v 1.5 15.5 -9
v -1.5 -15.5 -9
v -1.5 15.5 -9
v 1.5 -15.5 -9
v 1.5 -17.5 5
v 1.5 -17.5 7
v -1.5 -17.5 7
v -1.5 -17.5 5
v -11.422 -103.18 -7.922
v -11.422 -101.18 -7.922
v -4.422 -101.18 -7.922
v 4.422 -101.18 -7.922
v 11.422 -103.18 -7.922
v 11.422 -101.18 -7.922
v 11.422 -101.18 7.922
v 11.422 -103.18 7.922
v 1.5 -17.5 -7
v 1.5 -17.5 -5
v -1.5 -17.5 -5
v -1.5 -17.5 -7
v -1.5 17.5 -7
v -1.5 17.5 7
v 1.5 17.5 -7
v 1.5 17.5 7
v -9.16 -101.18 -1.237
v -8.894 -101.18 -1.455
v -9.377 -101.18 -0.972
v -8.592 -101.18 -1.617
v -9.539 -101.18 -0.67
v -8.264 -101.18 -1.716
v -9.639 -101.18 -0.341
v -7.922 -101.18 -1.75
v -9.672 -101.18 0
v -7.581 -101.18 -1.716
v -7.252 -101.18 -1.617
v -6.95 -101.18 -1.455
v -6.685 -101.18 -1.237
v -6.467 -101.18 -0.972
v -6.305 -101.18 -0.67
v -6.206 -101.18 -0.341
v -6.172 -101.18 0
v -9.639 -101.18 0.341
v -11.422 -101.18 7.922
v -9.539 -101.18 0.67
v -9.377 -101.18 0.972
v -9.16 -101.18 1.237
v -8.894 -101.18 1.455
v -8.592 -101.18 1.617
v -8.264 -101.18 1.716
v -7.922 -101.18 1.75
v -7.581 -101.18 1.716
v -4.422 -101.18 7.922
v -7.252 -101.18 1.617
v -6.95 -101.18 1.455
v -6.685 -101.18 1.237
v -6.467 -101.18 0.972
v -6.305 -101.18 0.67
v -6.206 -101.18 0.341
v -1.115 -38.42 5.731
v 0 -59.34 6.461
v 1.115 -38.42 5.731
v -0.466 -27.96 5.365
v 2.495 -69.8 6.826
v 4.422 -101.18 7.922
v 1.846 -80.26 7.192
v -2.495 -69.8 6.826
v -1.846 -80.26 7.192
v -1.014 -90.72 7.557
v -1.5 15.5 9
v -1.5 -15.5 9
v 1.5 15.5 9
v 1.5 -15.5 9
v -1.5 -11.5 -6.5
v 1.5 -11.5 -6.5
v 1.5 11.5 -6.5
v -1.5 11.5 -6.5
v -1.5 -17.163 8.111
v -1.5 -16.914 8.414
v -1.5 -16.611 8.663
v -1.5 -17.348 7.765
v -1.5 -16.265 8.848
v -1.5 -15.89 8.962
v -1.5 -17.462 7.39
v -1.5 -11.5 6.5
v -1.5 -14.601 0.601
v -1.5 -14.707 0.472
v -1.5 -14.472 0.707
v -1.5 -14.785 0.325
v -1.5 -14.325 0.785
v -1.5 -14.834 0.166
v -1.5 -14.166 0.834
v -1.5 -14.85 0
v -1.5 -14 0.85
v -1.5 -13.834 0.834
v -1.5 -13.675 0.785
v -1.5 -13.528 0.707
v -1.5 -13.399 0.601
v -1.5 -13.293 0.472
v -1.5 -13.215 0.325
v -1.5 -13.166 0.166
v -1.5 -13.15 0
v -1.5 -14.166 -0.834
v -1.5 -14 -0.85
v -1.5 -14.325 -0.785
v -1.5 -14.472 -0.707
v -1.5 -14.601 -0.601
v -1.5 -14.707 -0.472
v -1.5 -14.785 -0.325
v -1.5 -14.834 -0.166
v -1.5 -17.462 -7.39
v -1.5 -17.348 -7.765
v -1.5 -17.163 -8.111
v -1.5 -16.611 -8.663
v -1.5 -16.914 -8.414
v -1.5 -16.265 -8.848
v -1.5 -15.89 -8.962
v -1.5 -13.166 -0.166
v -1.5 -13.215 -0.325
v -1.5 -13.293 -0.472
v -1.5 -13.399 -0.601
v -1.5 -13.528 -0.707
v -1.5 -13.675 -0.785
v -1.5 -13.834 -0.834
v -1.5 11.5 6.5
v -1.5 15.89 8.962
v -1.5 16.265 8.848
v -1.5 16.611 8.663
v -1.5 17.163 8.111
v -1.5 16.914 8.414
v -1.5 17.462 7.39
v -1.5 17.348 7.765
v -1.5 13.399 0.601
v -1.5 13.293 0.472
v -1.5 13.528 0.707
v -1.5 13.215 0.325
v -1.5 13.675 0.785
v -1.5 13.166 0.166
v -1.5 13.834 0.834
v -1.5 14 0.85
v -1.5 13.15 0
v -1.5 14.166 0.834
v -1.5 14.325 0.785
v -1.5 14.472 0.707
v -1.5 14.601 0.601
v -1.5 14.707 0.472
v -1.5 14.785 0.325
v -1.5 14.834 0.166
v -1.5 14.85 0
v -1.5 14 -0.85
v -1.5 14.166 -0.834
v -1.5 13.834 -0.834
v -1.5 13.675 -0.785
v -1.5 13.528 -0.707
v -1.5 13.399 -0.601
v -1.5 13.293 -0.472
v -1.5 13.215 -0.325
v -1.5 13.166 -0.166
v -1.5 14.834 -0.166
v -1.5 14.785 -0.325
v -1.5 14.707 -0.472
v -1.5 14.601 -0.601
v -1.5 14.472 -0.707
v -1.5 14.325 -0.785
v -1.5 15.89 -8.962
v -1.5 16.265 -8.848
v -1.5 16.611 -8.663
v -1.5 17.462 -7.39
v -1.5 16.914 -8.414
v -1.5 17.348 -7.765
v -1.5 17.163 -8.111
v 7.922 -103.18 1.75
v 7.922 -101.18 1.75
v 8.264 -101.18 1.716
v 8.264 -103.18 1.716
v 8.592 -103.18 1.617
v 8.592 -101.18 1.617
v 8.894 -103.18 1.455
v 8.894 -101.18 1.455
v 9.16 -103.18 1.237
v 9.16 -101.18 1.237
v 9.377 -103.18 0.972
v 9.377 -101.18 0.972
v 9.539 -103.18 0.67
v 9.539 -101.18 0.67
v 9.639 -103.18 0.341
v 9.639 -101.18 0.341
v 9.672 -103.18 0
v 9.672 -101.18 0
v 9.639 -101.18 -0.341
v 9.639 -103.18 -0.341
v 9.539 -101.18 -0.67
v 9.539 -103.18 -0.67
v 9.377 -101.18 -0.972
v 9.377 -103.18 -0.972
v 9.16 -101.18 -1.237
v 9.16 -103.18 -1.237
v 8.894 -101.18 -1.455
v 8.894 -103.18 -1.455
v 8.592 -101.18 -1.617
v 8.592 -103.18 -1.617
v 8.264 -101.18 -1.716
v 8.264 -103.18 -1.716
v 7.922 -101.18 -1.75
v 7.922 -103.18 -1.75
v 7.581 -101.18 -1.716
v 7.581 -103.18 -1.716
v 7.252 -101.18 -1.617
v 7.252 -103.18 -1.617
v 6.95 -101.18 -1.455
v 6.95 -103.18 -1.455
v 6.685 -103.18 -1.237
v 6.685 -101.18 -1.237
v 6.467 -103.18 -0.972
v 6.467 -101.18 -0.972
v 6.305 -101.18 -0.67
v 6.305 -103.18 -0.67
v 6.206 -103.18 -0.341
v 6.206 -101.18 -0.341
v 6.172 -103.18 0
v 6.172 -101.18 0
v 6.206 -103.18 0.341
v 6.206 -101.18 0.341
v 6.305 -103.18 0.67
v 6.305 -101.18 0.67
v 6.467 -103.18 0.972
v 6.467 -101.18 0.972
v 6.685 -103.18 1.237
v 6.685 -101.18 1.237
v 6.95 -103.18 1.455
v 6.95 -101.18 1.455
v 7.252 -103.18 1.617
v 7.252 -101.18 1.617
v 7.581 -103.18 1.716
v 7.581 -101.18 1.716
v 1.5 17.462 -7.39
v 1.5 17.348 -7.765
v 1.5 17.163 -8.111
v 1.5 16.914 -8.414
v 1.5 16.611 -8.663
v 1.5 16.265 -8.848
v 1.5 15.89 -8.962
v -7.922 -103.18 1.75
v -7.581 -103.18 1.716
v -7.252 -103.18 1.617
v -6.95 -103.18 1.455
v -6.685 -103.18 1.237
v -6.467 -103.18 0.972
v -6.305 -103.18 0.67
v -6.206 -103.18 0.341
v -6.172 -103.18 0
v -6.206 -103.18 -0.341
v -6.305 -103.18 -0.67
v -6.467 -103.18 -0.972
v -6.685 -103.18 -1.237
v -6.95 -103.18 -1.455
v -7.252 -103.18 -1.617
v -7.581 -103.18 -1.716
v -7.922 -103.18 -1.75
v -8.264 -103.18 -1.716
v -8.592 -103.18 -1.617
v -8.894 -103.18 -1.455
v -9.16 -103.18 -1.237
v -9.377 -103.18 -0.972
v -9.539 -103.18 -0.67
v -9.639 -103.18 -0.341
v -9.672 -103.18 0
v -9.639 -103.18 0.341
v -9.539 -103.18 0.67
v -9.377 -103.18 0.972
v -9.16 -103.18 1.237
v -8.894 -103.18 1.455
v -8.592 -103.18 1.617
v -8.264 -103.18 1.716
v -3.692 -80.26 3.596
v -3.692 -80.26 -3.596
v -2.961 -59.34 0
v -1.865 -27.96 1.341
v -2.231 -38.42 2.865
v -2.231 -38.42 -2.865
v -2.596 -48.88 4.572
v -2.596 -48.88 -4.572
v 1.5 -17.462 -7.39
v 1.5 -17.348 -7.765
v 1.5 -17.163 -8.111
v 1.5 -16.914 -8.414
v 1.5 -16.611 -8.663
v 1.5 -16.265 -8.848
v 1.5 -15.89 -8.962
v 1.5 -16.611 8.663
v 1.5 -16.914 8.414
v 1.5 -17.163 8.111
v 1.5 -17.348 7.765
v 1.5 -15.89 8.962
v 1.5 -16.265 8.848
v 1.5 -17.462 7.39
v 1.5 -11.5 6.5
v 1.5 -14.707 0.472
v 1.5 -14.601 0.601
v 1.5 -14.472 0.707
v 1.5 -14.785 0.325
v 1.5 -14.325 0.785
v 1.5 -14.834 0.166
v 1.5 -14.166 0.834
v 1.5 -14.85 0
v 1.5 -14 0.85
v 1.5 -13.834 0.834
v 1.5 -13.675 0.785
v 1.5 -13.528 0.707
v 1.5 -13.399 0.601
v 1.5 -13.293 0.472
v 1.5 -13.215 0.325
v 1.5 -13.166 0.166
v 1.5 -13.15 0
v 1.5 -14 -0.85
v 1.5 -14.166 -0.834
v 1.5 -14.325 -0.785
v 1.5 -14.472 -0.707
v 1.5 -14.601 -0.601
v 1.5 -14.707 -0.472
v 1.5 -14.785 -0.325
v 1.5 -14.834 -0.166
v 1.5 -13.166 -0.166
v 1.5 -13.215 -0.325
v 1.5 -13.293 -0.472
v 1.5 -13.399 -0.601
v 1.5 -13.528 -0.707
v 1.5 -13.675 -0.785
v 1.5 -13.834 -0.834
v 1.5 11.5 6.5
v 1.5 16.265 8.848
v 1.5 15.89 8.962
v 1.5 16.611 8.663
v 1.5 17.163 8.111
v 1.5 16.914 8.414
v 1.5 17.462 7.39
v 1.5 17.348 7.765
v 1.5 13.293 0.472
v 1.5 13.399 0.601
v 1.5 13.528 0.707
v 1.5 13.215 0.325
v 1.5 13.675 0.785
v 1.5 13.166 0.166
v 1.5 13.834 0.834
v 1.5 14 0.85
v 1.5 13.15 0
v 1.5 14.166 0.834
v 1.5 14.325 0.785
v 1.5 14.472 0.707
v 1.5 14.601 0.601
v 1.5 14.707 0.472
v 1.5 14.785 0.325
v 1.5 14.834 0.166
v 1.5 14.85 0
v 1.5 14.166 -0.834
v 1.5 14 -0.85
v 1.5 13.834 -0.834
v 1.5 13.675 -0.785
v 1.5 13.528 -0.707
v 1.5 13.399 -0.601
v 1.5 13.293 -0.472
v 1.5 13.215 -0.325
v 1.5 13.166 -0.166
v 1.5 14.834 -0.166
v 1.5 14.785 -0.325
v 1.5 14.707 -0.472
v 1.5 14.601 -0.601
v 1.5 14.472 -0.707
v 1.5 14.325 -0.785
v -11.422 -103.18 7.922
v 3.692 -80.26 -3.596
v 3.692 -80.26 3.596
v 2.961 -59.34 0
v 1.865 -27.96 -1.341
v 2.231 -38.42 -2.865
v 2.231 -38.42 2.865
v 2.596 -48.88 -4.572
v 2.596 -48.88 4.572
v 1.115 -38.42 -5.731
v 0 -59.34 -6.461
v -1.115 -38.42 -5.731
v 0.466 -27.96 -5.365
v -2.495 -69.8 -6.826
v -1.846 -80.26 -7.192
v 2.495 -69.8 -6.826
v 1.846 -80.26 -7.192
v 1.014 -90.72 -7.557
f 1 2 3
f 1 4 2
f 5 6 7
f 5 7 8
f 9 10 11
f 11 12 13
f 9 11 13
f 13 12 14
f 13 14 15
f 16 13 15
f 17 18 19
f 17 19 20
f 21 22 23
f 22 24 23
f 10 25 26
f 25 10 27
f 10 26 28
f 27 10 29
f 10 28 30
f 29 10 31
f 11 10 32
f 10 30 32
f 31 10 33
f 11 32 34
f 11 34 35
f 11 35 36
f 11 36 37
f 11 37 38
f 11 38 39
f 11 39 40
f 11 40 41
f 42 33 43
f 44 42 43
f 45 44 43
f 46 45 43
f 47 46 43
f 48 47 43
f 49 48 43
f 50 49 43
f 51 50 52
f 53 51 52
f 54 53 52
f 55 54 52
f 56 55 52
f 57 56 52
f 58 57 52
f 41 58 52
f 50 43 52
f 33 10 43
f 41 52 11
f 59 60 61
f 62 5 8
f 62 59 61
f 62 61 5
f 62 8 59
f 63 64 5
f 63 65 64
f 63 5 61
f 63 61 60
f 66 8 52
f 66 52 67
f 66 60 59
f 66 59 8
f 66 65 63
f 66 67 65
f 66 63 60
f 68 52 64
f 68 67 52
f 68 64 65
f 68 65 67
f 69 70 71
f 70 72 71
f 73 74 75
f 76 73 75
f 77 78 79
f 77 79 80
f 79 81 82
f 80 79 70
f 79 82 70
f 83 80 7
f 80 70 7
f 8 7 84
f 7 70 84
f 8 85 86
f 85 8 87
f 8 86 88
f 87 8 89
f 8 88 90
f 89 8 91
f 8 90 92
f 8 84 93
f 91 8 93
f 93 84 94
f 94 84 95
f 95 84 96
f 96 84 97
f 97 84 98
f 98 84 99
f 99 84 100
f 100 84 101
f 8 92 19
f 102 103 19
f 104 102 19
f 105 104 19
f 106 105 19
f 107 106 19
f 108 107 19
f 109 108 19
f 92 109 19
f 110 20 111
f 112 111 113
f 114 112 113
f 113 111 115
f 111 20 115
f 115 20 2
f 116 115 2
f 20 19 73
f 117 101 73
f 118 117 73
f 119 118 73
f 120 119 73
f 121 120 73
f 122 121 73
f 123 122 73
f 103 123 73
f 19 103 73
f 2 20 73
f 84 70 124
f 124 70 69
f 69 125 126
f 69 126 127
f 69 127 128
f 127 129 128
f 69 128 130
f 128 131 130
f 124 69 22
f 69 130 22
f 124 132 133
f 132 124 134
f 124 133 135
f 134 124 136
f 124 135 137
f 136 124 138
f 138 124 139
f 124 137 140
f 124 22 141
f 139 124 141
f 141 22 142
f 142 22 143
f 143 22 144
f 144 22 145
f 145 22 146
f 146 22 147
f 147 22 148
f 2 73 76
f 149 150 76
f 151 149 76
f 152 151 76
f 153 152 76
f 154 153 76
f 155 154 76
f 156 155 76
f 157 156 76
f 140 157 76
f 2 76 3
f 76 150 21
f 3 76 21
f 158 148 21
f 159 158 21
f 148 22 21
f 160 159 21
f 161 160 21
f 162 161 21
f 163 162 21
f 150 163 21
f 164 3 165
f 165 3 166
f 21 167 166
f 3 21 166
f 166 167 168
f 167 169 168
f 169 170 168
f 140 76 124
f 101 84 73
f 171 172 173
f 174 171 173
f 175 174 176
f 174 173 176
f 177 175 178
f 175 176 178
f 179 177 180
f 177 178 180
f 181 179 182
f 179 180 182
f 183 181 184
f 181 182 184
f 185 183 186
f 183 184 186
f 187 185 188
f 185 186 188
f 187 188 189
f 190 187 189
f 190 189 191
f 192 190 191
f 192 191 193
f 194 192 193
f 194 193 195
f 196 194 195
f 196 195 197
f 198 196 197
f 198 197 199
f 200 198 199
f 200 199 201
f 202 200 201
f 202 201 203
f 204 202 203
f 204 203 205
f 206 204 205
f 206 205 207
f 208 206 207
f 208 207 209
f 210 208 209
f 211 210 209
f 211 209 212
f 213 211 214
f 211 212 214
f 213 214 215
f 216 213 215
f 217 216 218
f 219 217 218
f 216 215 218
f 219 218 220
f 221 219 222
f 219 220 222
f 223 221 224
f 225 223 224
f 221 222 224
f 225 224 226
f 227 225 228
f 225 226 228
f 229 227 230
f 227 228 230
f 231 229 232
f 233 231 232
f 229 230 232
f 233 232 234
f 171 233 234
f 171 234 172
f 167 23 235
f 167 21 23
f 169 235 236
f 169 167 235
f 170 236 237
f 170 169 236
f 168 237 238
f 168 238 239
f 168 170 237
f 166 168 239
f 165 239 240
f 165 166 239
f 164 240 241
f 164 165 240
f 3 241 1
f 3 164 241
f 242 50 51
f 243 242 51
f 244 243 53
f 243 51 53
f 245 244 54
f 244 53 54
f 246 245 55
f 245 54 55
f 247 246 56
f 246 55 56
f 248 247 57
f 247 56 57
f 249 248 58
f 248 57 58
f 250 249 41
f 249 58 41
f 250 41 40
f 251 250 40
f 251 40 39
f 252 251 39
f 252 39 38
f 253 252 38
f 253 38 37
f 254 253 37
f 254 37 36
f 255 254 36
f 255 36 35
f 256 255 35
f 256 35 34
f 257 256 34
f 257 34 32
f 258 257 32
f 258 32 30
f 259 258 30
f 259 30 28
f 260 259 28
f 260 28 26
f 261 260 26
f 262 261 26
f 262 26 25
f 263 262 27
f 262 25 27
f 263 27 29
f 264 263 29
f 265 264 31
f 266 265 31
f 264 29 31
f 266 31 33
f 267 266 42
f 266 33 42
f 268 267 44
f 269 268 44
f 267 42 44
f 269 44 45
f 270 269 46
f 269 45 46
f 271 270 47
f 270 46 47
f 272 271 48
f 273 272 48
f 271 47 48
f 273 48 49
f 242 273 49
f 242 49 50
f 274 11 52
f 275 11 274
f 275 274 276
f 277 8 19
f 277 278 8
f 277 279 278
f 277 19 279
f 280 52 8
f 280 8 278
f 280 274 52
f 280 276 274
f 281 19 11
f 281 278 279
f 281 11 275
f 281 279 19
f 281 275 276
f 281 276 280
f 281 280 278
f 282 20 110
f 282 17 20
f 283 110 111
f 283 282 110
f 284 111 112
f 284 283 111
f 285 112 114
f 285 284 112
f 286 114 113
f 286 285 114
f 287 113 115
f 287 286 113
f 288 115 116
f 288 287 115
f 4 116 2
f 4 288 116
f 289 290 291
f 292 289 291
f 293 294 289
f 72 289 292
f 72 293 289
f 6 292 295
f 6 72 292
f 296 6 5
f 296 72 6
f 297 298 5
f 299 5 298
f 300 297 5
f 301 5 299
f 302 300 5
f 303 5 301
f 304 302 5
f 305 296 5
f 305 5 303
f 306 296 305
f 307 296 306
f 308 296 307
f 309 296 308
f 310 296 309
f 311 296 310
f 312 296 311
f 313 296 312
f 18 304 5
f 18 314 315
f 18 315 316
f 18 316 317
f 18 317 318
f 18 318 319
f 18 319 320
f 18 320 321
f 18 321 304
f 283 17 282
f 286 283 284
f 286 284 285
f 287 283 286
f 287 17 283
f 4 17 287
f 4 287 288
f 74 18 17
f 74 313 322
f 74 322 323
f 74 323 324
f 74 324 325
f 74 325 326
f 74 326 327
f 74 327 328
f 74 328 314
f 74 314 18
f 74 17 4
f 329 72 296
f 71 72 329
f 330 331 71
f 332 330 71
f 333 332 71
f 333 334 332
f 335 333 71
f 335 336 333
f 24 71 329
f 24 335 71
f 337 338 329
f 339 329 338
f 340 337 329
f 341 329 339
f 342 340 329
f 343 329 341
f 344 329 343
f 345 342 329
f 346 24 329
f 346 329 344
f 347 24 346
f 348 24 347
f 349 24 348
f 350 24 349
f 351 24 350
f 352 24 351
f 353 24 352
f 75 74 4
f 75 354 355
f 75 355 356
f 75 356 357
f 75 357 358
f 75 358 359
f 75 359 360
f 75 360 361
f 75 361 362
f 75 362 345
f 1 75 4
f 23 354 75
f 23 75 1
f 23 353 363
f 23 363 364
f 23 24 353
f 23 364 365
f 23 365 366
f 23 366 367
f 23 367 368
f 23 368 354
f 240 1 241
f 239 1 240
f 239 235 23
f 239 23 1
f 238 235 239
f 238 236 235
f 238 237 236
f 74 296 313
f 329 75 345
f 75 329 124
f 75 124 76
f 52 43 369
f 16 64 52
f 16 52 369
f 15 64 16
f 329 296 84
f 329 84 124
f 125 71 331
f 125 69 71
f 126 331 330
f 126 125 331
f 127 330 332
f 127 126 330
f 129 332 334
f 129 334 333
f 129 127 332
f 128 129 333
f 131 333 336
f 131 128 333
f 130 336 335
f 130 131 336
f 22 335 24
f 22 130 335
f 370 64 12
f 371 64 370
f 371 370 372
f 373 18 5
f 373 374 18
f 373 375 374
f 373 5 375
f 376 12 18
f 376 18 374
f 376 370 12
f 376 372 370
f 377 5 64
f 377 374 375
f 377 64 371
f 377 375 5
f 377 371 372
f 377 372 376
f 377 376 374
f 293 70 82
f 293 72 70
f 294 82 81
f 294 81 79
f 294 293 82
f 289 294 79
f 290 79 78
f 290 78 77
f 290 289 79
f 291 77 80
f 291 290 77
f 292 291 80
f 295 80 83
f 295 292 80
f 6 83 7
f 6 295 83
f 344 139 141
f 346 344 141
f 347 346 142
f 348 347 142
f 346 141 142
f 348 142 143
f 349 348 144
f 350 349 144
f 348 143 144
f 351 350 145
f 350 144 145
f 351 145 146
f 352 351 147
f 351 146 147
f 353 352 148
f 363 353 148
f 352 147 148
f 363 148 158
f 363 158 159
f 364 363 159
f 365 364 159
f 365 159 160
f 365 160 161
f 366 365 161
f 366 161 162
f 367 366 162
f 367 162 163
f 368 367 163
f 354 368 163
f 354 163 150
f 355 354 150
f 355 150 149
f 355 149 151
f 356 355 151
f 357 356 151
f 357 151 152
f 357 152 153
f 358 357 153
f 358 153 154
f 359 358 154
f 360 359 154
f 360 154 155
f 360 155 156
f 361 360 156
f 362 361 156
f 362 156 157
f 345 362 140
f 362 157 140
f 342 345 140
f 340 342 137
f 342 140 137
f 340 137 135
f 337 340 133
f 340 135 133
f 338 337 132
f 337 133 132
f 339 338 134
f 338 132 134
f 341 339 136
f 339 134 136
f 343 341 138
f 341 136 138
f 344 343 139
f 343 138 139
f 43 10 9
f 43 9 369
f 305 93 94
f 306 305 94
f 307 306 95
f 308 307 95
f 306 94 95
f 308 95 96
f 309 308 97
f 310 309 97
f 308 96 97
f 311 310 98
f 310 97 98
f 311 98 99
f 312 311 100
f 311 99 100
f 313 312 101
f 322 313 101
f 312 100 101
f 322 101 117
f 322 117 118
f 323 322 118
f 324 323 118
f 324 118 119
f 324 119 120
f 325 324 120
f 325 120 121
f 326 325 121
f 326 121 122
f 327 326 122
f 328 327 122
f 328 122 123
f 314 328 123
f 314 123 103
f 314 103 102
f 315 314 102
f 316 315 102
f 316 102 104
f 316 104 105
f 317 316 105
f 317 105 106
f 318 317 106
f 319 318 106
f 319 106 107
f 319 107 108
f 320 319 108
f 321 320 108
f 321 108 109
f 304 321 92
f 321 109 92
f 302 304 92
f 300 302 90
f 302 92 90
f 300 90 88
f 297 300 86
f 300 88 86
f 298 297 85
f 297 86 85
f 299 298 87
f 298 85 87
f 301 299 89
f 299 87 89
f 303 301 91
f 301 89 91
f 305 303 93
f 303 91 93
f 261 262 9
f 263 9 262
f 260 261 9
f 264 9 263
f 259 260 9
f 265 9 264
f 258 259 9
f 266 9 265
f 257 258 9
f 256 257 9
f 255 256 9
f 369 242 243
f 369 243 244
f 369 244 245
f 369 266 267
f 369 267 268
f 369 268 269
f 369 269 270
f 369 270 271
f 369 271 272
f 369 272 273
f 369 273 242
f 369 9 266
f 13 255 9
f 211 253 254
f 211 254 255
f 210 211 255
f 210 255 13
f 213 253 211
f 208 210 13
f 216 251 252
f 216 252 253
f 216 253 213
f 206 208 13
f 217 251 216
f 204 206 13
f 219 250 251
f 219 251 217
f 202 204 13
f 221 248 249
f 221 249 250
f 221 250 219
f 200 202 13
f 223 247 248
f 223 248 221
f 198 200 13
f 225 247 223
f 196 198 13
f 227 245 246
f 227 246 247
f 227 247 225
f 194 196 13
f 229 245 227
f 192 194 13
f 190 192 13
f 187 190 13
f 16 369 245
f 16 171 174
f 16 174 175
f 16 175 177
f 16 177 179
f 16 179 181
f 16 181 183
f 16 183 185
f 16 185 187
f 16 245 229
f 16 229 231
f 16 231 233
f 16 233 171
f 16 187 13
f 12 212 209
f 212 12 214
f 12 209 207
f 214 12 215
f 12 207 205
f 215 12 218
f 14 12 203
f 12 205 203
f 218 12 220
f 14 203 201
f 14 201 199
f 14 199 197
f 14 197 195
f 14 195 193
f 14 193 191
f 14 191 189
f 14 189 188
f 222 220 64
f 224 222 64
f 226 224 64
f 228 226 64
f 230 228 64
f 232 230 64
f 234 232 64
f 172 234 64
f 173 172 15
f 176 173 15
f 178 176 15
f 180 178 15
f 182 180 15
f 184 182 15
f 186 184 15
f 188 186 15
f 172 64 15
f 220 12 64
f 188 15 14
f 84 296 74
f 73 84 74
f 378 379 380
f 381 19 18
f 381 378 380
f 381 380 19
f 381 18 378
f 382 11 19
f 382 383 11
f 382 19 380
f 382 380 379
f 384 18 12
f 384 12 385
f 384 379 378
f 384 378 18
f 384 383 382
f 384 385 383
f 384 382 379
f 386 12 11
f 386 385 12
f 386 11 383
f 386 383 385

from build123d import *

# Parameters (mm, degrees)
ESBO_O1_W                = 18
ESBO_O1_H                = 35
RESSALTO_EXTRUS_O1_DEPTH = 1.5
CORTE_EXTRUS_O1_REACH    = 21.906
ESBO_O2_W                = 13
ESBO_O2_H                = 23
CORTE_EXTRUS_O2_REACH    = 21.906
ESBO_O3_R                = 0.85
FILETE1_R                = 2
ESBO_O4_W                = 3
ESBO_O4_H                = 10
RESSALTO_EXTRUS_O2_DEPTH = 83.68
RESSALTO_EXTRUS_O2_TAPER = -2
ESBO_O5_W                = 22.844339982
ESBO_O5_H                = 15.844339982
RESSALTO_EXTRUS_O3_DEPTH = 2
CORTE_EXTRUS_O3_REACH    = 121.568
ESBO_O6_R                = 1.75


with BuildPart() as part:
    # Esboço1 → Ressalto-extrusão1 (new, symmetric)
    with BuildSketch(Plane(origin=(0, 0, 0), x_dir=(0, 0, -1), z_dir=(1, 0, 0))):
        Rectangle(ESBO_O1_W, ESBO_O1_H)
    extrude(amount=RESSALTO_EXTRUS_O1_DEPTH, both=True)

    # Esboço2 → Corte-extrusão1 (cut, up to next)
    with BuildSketch(Plane(origin=(1.5, 0, 0), x_dir=(0, 0, -1), z_dir=(1, 0, 0)), mode=Mode.PRIVATE) as corte_extrus_o1_sk1:
        Rectangle(ESBO_O2_W, ESBO_O2_H)
    corte_extrus_o1_tool1 = extrude(corte_extrus_o1_sk1.sketch, amount=-CORTE_EXTRUS_O1_REACH, mode=Mode.PRIVATE) & part.part
    add(corte_extrus_o1_tool1.solids().sort_by_distance((1.5, 0, 0))[0], mode=Mode.SUBTRACT)

    # Esboço3 → Corte-extrusão2 (cut, up to next)
    with BuildSketch(Plane.ZY.offset(1.5), mode=Mode.PRIVATE) as corte_extrus_o2_sk1:
        with Locations((0, 14)):
            Circle(ESBO_O3_R)
    corte_extrus_o2_tool1 = extrude(corte_extrus_o2_sk1.sketch, amount=-CORTE_EXTRUS_O2_REACH, mode=Mode.PRIVATE) & part.part
    # Esboço3 → Corte-extrusão2 (cut, up to next)
    with BuildSketch(Plane.ZY.offset(1.5), mode=Mode.PRIVATE) as corte_extrus_o2_sk2:
        with Locations((0, -14)):
            Circle(ESBO_O3_R)
    corte_extrus_o2_tool2 = extrude(corte_extrus_o2_sk2.sketch, amount=-CORTE_EXTRUS_O2_REACH, mode=Mode.PRIVATE) & part.part
    add(corte_extrus_o2_tool1.solids().sort_by_distance((-1.5, 14, 0))[0], mode=Mode.SUBTRACT)
    add(corte_extrus_o2_tool2.solids().sort_by_distance((-1.5, -14, 0))[0], mode=Mode.SUBTRACT)

    # Filete1
    filete1_edges = [part.edges().sort_by_distance(p)[0] for p in [
        (0, -17.5, -9),
        (0, -17.5, 9),
        (0, 17.5, 9),
        (0, 17.5, -9),
    ]]
    fillet(filete1_edges, radius=FILETE1_R)

    # Esboço4 → Ressalto-extrusão2 (add)
    with BuildSketch(Plane.XZ.offset(17.5)):
        Rectangle(ESBO_O4_W, ESBO_O4_H)
    extrude(amount=RESSALTO_EXTRUS_O2_DEPTH, taper=RESSALTO_EXTRUS_O2_TAPER)

    # Esboço5 → Ressalto-extrusão3 (add)
    with BuildSketch(Plane.XZ.offset(101.18)):
        Rectangle(ESBO_O5_W, ESBO_O5_H)
    extrude(amount=RESSALTO_EXTRUS_O3_DEPTH)

    # Esboço6 → Corte-extrusão3 (cut, up to next)
    with BuildSketch(Plane(origin=(0, -101.18, 0), x_dir=(1, 0, 0), z_dir=(0, 1, 0)), mode=Mode.PRIVATE) as corte_extrus_o3_sk1:
        with Locations(Location((7.922169991, 0, 0), (0, 0, 270))):
            Circle(ESBO_O6_R)
    corte_extrus_o3_tool1 = extrude(corte_extrus_o3_sk1.sketch, amount=-CORTE_EXTRUS_O3_REACH, mode=Mode.PRIVATE) & part.part
    # Esboço6 → Corte-extrusão3 (cut, up to next)
    with BuildSketch(Plane(origin=(0, -101.18, 0), x_dir=(1, 0, 0), z_dir=(0, 1, 0)), mode=Mode.PRIVATE) as corte_extrus_o3_sk2:
        with Locations(Location((-7.922169991, 0, 0), (0, 0, 270))):
            Circle(ESBO_O6_R)
    corte_extrus_o3_tool2 = extrude(corte_extrus_o3_sk2.sketch, amount=-CORTE_EXTRUS_O3_REACH, mode=Mode.PRIVATE) & part.part
    add(corte_extrus_o3_tool1.solids().sort_by_distance((7.92217, -101.18, 0))[0], mode=Mode.SUBTRACT)
    add(corte_extrus_o3_tool2.solids().sort_by_distance((-7.92217, -101.18, 0))[0], mode=Mode.SUBTRACT)


solid = part.part
